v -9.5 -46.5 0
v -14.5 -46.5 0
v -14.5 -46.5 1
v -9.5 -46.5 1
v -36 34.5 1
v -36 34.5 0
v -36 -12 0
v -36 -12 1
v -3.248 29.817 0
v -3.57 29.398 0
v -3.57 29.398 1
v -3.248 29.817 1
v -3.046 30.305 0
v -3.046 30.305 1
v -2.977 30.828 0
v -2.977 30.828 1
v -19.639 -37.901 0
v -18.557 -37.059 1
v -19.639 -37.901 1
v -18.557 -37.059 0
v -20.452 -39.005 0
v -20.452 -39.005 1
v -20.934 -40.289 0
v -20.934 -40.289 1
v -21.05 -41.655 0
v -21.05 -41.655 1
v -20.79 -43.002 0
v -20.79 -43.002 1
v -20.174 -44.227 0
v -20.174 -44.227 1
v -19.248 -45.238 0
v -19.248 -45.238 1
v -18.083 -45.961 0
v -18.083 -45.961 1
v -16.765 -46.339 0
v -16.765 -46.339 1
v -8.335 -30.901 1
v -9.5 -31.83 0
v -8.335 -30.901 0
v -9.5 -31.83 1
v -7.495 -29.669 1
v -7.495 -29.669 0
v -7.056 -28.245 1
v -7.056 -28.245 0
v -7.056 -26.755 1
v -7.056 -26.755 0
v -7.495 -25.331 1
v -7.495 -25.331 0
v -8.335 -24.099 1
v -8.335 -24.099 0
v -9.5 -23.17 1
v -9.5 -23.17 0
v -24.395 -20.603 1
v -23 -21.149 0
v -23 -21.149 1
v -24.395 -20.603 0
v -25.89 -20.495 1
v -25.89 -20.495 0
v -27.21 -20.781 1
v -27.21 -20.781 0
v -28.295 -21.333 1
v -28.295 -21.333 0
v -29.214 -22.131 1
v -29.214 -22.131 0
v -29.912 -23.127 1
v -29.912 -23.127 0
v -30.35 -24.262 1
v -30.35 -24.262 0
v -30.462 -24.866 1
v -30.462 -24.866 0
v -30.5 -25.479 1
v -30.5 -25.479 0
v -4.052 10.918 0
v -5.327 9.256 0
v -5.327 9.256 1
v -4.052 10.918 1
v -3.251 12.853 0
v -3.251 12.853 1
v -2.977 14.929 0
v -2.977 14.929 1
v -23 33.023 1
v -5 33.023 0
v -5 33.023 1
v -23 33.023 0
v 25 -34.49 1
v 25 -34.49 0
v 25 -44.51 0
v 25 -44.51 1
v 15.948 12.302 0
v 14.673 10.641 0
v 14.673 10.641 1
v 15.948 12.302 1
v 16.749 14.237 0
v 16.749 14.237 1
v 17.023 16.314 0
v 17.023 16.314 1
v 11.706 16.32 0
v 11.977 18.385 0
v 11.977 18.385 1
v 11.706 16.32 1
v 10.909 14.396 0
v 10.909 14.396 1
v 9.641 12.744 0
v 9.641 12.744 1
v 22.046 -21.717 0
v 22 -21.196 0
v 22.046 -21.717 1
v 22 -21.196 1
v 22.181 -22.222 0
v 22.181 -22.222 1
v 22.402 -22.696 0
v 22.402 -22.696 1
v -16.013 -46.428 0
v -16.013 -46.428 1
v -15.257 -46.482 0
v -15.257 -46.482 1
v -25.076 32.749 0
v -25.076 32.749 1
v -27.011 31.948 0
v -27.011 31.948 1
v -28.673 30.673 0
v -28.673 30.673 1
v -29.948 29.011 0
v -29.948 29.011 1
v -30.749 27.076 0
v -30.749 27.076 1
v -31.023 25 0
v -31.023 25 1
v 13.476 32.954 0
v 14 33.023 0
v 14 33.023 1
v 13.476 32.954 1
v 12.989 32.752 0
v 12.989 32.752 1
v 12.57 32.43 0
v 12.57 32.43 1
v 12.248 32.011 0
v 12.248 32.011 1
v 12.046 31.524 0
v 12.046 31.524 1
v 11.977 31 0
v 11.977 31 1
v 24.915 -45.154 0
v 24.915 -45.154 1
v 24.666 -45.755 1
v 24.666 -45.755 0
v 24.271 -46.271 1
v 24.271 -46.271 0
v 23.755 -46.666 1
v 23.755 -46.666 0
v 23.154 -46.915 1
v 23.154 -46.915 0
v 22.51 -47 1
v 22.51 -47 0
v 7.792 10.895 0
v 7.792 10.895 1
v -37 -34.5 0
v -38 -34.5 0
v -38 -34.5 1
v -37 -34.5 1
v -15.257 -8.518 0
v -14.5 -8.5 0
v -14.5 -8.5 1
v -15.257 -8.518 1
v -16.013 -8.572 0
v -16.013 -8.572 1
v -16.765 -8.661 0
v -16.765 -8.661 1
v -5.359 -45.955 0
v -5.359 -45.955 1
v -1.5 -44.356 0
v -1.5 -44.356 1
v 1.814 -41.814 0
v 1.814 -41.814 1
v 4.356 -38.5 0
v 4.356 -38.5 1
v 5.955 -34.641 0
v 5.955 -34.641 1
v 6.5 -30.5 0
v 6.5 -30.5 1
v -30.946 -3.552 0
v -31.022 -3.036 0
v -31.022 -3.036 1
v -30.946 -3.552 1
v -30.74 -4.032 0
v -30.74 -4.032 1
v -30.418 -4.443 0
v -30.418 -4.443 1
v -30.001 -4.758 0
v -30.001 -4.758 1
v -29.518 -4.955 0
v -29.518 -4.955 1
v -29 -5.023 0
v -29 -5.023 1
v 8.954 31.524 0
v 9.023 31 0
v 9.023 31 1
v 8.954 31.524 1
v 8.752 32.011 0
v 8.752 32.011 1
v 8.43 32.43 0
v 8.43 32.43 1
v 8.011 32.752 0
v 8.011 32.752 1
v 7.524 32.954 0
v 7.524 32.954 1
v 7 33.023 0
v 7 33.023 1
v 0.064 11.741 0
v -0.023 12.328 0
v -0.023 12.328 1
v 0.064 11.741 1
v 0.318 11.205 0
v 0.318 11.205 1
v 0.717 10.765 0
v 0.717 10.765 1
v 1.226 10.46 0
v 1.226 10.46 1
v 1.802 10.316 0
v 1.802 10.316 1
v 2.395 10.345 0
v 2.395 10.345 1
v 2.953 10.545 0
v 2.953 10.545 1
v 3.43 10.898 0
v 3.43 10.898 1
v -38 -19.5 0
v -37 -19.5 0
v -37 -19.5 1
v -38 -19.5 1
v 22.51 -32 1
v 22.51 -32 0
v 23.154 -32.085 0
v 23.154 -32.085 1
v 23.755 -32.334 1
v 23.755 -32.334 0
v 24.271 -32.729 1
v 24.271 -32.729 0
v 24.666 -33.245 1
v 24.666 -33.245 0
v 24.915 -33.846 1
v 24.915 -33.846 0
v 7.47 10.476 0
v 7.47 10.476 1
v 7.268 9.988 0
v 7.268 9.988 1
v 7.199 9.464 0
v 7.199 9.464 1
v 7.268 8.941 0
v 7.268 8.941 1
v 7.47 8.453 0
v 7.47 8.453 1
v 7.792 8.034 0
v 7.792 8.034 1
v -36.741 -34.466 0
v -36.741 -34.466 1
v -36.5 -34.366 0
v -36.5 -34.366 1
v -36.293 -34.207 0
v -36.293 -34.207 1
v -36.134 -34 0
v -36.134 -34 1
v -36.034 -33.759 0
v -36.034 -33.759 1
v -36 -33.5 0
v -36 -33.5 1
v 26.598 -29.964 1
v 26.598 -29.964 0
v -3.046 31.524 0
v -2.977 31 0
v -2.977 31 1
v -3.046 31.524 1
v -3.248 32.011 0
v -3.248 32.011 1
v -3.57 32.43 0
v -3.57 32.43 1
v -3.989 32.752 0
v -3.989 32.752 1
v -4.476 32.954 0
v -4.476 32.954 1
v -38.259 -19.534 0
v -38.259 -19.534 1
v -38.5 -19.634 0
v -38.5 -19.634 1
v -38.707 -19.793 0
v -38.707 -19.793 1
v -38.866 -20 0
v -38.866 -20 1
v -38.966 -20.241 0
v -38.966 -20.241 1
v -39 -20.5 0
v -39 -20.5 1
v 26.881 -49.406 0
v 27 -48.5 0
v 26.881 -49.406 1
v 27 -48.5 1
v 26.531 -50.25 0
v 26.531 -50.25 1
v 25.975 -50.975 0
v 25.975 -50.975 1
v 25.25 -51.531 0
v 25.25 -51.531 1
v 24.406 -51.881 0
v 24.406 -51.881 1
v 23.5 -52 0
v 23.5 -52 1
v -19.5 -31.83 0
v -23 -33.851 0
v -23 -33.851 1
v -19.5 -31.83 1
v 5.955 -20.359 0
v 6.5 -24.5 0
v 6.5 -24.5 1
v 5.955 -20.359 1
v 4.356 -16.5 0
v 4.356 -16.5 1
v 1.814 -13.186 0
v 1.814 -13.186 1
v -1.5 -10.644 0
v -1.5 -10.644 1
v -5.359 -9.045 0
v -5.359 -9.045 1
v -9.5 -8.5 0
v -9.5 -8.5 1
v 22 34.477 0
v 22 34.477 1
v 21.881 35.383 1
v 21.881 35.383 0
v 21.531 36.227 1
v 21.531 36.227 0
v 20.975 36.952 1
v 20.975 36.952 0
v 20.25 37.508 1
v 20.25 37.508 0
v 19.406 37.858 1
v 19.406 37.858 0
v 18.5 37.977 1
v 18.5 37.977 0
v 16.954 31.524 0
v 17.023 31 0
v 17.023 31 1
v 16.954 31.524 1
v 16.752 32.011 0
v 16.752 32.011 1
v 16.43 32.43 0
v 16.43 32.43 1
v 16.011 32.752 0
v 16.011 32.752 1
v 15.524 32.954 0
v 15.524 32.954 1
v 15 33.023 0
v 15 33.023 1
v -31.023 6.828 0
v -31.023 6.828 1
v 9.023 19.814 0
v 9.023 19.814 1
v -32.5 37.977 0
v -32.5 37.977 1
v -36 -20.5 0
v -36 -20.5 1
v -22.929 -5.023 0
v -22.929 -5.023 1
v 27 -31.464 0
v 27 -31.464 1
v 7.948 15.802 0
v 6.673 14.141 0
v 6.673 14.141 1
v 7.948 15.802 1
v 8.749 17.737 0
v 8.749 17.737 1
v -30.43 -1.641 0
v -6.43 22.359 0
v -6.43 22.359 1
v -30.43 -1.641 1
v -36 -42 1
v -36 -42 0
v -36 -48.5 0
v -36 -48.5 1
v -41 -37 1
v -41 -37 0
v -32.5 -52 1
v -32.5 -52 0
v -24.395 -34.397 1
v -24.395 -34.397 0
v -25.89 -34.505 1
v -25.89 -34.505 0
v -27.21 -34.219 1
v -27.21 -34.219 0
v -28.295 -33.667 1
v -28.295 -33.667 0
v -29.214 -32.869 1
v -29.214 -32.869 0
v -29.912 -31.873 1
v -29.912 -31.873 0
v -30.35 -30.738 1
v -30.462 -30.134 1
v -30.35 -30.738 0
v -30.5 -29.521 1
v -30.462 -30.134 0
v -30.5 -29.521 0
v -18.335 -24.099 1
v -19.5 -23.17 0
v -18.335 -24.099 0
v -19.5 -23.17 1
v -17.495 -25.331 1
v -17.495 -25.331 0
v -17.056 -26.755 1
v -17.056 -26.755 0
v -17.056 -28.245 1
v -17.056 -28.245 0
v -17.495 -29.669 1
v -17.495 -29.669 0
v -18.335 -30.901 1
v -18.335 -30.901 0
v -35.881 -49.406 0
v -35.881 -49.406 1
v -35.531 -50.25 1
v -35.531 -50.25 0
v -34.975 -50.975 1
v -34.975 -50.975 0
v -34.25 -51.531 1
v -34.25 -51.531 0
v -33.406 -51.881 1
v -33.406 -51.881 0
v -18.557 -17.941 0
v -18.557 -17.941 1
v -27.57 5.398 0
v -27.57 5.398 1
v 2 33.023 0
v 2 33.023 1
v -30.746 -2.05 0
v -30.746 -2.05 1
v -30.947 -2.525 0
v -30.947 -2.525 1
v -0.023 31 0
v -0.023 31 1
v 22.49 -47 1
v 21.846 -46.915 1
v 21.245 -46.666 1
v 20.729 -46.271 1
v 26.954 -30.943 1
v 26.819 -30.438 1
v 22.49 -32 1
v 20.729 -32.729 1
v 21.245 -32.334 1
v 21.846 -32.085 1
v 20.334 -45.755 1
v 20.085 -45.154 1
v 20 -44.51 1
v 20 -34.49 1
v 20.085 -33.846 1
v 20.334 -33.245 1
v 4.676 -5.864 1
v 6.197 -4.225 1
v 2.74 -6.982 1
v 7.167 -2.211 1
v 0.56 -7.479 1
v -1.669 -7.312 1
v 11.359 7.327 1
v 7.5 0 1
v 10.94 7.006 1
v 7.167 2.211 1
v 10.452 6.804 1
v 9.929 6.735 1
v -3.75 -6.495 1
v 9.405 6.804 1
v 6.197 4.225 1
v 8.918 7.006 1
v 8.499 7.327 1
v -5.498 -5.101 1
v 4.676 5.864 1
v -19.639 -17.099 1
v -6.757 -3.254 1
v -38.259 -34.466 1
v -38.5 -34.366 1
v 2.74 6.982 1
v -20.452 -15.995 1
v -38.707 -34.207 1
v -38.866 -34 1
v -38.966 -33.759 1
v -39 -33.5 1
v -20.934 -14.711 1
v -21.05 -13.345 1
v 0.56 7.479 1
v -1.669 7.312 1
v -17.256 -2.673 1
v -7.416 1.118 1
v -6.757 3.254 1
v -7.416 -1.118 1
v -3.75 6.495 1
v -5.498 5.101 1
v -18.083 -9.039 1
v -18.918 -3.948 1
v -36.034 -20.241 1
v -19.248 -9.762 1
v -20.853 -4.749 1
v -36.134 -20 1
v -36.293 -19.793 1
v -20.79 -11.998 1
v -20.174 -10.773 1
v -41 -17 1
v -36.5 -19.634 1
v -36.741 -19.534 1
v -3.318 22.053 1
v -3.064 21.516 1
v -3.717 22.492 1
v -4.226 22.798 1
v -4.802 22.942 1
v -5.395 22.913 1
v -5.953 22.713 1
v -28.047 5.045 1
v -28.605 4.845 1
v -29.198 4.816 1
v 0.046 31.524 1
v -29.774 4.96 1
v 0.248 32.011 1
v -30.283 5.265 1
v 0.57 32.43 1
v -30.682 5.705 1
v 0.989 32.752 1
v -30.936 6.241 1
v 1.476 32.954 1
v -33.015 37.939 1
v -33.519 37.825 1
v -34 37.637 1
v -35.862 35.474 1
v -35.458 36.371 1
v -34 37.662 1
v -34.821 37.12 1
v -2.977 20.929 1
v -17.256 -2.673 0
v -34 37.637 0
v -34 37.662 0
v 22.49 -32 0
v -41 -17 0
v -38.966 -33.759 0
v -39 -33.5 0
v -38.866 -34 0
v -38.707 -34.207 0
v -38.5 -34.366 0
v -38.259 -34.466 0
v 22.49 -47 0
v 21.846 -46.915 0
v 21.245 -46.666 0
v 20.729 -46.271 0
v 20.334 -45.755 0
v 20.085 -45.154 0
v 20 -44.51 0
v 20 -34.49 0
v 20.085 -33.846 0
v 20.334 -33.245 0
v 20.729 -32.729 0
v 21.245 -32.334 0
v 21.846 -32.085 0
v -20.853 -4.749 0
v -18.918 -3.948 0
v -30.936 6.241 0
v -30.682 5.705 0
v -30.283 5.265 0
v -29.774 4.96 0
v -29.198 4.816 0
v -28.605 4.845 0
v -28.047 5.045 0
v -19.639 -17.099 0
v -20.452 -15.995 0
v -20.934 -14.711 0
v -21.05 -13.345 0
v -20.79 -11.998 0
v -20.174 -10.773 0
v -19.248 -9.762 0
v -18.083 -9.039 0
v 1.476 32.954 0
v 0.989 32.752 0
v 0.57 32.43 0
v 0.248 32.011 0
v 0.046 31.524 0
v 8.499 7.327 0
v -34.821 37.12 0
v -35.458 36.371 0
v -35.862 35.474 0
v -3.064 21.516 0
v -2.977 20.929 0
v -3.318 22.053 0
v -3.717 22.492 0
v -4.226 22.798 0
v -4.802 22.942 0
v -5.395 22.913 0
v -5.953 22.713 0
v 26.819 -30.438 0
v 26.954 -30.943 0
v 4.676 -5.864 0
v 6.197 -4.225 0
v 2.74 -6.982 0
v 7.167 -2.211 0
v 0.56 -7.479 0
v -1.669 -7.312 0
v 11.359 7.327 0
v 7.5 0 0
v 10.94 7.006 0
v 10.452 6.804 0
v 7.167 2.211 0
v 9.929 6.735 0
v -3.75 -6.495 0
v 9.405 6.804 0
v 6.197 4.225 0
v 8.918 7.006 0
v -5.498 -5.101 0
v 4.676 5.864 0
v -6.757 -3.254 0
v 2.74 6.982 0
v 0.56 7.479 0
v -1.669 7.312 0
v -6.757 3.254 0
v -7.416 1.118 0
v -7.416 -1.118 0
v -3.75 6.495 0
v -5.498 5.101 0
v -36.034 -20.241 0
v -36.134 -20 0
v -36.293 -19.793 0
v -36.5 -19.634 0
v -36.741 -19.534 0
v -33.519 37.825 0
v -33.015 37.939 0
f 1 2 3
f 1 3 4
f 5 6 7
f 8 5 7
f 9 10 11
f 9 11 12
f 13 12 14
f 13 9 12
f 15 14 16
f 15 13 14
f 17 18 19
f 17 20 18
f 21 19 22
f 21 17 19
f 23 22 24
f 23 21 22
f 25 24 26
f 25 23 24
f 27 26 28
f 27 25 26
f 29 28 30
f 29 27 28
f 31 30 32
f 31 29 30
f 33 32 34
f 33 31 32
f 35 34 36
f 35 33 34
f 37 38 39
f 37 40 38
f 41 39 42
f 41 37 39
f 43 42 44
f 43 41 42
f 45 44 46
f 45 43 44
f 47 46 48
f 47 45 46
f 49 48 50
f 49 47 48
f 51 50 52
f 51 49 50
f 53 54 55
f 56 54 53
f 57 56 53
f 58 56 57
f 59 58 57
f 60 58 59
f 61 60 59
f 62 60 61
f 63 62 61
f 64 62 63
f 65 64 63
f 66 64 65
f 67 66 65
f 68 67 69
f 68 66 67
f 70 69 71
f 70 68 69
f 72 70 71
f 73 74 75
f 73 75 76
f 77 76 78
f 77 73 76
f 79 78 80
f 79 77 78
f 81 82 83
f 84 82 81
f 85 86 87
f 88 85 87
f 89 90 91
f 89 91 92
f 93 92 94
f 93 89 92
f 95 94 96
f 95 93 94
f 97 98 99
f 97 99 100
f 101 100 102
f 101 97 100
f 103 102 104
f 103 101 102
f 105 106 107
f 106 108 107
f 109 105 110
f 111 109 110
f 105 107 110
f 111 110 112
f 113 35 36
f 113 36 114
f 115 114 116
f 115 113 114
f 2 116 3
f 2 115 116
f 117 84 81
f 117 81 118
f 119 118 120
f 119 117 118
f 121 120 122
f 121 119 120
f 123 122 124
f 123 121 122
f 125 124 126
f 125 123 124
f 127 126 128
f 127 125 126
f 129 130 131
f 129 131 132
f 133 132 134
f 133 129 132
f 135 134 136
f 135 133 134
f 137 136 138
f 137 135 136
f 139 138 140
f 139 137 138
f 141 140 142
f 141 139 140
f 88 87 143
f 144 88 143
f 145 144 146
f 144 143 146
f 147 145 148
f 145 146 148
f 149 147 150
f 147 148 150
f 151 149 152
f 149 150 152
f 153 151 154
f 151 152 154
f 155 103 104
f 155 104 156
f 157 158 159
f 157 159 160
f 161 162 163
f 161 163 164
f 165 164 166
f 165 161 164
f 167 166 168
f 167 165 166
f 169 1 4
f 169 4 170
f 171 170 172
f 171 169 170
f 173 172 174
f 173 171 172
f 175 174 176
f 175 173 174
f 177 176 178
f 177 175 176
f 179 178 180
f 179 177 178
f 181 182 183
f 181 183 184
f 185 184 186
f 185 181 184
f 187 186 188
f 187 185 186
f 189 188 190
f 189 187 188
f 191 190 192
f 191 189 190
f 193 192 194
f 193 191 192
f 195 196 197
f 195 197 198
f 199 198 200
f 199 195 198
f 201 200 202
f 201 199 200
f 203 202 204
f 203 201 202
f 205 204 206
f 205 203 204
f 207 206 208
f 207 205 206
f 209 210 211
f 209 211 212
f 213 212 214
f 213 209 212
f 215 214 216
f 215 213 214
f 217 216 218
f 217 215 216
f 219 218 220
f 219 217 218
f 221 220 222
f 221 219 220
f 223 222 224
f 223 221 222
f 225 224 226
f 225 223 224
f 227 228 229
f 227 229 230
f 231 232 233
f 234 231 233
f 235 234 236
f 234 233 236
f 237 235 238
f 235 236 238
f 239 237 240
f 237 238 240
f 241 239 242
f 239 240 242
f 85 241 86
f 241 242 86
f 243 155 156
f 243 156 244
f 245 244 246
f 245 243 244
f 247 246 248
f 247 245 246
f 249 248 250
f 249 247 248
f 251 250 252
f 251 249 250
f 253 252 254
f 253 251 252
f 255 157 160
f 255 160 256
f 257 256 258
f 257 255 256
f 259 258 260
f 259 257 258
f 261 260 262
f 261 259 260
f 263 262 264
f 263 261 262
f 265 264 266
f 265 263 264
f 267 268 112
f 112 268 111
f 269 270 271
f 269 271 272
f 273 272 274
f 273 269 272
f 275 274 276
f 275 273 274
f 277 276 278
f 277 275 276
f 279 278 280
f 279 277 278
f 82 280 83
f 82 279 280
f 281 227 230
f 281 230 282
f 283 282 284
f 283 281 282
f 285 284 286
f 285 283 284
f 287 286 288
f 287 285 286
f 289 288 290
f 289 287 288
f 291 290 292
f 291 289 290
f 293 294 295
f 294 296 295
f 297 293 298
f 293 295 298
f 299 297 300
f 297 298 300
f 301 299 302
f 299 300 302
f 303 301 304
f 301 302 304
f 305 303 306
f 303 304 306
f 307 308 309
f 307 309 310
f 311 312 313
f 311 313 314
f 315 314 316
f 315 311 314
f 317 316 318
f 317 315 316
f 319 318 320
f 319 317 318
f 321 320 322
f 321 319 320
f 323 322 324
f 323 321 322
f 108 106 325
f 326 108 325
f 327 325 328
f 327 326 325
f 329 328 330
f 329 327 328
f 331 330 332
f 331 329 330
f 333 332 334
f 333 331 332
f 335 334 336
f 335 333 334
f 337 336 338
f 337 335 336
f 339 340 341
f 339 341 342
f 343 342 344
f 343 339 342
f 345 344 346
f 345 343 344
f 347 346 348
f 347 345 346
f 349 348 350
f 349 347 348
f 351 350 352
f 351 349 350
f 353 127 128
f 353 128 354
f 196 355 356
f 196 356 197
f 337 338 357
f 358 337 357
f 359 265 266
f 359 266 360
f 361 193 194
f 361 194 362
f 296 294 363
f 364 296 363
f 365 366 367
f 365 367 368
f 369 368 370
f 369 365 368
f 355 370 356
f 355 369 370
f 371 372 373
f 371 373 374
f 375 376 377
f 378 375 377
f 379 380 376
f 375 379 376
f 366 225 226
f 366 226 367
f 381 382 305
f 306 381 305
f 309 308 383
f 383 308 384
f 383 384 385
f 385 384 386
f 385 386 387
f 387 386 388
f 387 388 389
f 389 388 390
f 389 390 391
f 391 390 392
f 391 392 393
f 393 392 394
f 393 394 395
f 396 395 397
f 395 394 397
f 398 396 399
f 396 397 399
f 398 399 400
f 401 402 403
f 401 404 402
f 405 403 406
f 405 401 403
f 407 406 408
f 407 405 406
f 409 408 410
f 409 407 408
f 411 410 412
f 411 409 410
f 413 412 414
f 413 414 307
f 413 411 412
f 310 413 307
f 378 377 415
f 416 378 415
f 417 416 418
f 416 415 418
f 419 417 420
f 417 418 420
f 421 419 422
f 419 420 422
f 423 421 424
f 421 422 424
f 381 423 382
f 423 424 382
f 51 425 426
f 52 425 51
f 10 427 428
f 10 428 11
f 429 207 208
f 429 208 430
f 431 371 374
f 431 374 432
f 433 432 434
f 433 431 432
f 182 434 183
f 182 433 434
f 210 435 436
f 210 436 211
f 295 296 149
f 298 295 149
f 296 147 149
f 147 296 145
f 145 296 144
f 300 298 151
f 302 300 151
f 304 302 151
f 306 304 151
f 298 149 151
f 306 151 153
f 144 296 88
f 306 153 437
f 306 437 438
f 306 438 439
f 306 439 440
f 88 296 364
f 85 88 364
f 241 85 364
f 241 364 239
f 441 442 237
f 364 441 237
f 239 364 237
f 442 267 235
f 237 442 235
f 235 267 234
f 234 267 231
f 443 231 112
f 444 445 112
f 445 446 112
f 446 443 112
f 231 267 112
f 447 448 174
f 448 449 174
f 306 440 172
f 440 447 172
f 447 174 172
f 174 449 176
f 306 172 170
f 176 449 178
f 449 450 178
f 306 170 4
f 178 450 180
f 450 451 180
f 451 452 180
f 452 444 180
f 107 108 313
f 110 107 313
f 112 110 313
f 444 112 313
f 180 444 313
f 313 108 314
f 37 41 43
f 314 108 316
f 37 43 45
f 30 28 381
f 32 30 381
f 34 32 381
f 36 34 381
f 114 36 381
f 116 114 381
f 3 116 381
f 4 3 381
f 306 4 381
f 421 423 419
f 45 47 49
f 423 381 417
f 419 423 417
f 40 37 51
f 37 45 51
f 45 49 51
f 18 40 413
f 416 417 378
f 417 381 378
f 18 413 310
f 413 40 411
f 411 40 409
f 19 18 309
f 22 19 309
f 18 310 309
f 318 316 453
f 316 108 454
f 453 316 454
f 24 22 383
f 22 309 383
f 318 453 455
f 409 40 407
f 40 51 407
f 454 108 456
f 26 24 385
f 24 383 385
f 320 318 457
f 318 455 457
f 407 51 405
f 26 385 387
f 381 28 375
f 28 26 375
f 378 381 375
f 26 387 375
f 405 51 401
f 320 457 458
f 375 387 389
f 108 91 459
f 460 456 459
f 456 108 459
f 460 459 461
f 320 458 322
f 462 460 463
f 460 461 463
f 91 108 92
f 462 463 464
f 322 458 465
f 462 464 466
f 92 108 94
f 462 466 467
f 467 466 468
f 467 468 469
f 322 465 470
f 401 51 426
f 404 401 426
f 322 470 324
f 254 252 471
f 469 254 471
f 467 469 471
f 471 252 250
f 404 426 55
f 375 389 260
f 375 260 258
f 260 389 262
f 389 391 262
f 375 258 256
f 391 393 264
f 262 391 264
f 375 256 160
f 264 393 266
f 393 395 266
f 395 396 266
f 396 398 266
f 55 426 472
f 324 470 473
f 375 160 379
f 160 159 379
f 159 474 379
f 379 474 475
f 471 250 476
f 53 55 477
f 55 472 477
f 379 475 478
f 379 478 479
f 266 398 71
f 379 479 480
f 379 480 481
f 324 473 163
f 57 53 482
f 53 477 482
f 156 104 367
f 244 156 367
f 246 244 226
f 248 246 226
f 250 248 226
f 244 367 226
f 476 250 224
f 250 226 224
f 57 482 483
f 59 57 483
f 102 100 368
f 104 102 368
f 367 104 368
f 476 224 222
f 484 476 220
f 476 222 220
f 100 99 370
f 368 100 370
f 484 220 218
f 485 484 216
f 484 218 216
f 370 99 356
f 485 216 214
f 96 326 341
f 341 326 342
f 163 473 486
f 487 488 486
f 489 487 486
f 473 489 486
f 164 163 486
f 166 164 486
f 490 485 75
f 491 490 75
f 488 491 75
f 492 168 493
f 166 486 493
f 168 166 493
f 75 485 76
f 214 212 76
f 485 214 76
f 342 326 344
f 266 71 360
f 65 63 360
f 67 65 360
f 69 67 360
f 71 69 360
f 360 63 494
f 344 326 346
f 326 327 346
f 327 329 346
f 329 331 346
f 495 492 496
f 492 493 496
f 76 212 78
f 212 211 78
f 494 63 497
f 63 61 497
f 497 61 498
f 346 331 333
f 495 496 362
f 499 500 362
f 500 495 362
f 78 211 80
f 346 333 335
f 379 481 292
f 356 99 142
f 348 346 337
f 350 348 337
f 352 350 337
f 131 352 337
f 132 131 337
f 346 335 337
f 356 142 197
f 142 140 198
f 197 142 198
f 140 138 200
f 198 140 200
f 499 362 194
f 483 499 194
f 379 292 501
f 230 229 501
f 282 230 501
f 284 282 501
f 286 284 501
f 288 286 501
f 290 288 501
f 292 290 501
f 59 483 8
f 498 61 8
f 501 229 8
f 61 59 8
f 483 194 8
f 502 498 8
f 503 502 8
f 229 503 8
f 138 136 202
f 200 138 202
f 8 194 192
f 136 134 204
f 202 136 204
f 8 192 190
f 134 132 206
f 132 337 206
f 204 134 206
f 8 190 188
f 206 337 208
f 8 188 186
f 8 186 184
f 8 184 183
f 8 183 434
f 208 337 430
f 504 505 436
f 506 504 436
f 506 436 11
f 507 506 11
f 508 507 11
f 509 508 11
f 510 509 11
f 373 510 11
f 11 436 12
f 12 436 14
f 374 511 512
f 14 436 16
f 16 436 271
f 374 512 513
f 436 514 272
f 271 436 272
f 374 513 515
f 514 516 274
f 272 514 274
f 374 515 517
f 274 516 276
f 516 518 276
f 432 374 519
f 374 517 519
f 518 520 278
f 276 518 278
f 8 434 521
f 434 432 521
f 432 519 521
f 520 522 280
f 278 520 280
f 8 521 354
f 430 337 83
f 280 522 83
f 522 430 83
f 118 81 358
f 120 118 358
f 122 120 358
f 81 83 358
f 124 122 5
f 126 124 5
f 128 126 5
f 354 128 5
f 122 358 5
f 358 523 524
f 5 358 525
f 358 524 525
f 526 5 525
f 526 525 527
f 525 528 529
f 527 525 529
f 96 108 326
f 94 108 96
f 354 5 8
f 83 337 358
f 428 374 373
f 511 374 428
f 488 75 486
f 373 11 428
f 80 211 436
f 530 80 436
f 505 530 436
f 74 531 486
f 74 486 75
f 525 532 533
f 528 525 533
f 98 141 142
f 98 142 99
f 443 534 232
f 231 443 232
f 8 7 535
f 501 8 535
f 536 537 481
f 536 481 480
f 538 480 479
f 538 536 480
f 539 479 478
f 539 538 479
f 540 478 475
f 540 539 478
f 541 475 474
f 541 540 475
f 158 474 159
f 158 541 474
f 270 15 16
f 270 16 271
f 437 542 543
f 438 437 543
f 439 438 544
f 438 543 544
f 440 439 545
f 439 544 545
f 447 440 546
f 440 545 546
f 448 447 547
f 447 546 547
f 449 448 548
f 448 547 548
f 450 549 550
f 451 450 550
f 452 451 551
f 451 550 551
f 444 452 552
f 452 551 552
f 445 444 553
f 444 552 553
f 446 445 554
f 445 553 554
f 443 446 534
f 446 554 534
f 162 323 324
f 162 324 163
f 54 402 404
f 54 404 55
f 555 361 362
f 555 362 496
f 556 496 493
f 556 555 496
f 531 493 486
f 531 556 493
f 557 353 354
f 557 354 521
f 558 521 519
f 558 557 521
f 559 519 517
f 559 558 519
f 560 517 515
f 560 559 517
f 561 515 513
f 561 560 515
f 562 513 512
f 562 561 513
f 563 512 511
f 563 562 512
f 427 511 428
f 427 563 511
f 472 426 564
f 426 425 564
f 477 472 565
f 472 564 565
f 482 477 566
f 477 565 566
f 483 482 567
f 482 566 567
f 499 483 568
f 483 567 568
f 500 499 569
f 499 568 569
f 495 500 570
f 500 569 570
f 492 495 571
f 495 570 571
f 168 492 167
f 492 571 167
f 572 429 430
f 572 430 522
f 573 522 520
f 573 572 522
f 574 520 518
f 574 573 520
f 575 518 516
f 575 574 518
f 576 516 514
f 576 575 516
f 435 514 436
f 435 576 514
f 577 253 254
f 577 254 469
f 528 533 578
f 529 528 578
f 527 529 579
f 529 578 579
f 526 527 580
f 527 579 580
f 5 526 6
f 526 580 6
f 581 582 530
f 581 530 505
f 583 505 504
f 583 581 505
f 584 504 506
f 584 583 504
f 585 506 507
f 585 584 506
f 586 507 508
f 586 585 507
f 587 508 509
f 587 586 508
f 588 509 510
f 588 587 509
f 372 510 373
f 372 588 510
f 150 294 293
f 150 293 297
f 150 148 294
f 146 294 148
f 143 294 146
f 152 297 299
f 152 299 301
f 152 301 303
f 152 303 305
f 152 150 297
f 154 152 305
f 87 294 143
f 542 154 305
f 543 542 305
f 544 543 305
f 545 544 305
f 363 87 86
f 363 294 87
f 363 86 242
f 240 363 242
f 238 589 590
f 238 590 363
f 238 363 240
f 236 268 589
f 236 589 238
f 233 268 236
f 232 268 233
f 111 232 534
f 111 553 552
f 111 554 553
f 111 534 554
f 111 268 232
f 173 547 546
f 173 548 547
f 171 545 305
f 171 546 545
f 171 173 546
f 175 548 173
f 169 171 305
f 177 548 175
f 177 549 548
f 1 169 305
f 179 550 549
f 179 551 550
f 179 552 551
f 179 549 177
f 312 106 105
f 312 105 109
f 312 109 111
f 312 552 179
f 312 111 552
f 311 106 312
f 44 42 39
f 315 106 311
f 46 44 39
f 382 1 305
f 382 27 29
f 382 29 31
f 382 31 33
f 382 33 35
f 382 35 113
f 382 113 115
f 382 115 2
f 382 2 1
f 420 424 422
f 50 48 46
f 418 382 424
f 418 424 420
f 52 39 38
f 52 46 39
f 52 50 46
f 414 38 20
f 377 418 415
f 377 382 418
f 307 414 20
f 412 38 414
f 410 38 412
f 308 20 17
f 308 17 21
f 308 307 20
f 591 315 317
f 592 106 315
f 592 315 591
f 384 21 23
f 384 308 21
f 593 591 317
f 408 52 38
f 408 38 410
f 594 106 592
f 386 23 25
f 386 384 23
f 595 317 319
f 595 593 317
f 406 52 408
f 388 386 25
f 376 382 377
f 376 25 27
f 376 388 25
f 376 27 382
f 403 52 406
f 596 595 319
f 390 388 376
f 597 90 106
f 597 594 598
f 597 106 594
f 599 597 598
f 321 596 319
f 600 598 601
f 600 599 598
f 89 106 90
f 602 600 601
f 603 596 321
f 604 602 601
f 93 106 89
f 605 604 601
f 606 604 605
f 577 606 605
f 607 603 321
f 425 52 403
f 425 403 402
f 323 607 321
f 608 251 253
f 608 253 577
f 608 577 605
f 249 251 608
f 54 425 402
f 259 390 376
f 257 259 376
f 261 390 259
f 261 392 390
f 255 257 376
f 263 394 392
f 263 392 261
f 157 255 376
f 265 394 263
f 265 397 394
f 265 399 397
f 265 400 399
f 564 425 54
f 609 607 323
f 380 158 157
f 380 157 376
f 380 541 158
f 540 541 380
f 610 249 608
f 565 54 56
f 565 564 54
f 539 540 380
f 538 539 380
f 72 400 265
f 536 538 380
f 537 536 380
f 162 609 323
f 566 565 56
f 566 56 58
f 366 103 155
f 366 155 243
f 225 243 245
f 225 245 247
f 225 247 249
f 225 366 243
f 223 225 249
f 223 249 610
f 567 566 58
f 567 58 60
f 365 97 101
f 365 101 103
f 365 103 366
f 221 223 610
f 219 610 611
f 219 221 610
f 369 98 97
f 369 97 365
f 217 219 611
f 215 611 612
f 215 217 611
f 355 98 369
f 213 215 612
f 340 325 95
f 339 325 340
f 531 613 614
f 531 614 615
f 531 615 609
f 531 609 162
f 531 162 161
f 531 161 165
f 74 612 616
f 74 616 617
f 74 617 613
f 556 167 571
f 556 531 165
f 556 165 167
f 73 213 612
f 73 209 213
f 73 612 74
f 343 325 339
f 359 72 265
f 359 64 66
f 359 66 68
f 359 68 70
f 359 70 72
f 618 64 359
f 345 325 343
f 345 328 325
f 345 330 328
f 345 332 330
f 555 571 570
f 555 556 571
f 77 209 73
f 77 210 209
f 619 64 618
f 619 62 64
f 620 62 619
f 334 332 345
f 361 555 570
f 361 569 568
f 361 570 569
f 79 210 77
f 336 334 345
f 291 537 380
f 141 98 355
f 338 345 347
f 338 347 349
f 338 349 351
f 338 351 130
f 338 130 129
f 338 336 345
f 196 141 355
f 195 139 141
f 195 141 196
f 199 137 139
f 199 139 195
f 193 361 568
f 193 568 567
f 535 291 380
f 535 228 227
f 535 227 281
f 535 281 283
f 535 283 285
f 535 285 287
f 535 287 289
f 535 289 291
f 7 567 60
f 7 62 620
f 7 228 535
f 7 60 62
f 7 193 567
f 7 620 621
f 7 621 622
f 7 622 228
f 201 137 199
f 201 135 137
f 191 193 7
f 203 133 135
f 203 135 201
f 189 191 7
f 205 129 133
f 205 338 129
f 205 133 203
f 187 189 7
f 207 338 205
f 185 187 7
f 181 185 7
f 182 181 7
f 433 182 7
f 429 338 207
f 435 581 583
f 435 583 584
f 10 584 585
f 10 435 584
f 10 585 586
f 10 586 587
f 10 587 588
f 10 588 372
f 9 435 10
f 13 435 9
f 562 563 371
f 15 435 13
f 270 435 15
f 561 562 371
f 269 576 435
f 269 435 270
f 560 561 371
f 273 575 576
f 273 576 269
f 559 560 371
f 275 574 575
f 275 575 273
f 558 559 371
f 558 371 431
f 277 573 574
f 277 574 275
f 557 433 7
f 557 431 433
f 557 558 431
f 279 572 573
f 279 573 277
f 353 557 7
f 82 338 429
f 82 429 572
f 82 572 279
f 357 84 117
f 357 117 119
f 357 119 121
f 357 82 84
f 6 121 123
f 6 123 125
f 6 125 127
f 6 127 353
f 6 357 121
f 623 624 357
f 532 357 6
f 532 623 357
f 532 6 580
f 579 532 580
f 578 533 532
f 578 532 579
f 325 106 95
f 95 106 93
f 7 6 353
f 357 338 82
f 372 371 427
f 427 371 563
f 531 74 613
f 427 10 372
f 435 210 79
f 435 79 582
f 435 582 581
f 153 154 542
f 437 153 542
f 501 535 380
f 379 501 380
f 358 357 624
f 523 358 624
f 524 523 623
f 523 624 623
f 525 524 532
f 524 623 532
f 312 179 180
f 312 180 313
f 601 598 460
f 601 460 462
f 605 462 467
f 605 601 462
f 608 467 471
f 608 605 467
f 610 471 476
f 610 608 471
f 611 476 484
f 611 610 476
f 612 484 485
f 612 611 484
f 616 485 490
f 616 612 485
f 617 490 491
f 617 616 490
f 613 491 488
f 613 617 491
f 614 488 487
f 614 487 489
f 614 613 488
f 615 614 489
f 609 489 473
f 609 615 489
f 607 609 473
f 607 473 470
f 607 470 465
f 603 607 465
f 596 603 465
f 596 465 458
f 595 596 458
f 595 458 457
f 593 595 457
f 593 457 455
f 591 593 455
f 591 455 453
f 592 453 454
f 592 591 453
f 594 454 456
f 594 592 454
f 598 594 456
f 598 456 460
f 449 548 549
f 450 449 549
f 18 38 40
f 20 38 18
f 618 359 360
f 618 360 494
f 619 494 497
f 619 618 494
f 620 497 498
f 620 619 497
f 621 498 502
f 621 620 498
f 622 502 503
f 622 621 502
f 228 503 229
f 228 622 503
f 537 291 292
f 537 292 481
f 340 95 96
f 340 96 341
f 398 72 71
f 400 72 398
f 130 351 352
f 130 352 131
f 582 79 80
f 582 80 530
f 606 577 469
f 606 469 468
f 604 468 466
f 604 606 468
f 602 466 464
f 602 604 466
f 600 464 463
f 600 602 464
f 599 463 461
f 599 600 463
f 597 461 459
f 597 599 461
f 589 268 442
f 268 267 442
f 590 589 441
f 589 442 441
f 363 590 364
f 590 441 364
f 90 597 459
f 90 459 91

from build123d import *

# Parameters (mm, degrees)
SKETCH_1_R          = 7.5
EXTRUDE_1_DEPTH     = 1
FILLET_1_R          = 3
FILLET_2_R          = 3.5
CUT_EXTRUDE_1_DEPTH = 10
EXTRUDE_2_DEPTH     = 1
FILLET_3_R          = 5


with BuildPart() as part:
    # 草图1 → 凸台-拉伸1 (new body)
    with BuildSketch(Plane.XY):
        with BuildLine():
            Line((-34, 37.637190605), (-34, 37.66227766))
            ThreePointArc((-34, 37.66227766), (-35.458039892, 36.370828693), (-36, 34.5))
            Line((-36, 34.5), (-36, -12))
            Line((-36, -12), (-41, -17))
            Line((-41, -17), (-41, -37))
            Line((-41, -37), (-36, -42))
            Line((-36, -42), (-36, -48.5))
            ThreePointArc((-36, -48.5), (-34.974873734, -50.974873734), (-32.5, -52))
            Line((-32.5, -52), (-3, -52))
            Line((-3, -52), (27, -52))
            Line((27, -52), (27, -30.660254038))
            Line((27, -30.660254038), (22, -22))
            Line((22, -22), (22, -2))
            Line((22, -2), (22, 37.977350269))
            Line((22, 37.977350269), (-32.5, 37.977350269))
            ThreePointArc((-32.5, 37.977350269), (-33.269043009, 37.891244277), (-34, 37.637190605))
        make_face()
        Circle(SKETCH_1_R, mode=Mode.SUBTRACT)
        with BuildLine():
            Line((-38, -34.5), (-37, -34.5))
            ThreePointArc((-37, -34.5), (-36.292893219, -34.207106781), (-36, -33.5))
            Line((-36, -33.5), (-36, -20.5))
            ThreePointArc((-36, -20.5), (-36.292893219, -19.792893219), (-37, -19.5))
            Line((-37, -19.5), (-38, -19.5))
            ThreePointArc((-38, -19.5), (-38.707106781, -19.792893219), (-39, -20.5))
            Line((-39, -20.5), (-39, -33.5))
            ThreePointArc((-39, -33.5), (-38.707106781, -34.207106781), (-38, -34.5))
        make_face(mode=Mode.SUBTRACT)
        with BuildLine():
            Line((-14.5, -46.5), (-9.5, -46.5))
            ThreePointArc((-9.5, -46.5), (1.813708499, -41.813708499), (6.5, -30.5))
            Line((6.5, -30.5), (6.5, -24.5))
            ThreePointArc((6.5, -24.5), (1.813708499, -13.186291501), (-9.5, -8.5))
            Line((-9.5, -8.5), (-14.5, -8.5))
            ThreePointArc((-14.5, -8.5), (-25.813708499, -13.186291501), (-30.5, -24.5))
            Line((-30.5, -24.5), (-30.5, -30.5))
            ThreePointArc((-30.5, -30.5), (-25.813708499, -41.813708499), (-14.5, -46.5))
        make_face(mode=Mode.SUBTRACT)
        with BuildLine():
            Line((11.977350269, 31), (11.977350269, 18.384776311))
            ThreePointArc((11.977350269, 18.384776311), (11.370110637, 15.331976529), (9.640838471, 12.74393784))
            Line((9.640838471, 12.74393784), (7.791596066, 10.894695435))
            ThreePointArc((7.791596066, 10.894695435), (7.199175676, 9.464466094), (7.791596066, 8.034236753))
            Line((7.791596066, 8.034236753), (8.498702848, 7.327129972))
            ThreePointArc((8.498702848, 7.327129972), (9.928932188, 6.734709582), (11.359161529, 7.327129972))
            Line((11.359161529, 7.327129972), (14.672870028, 10.640838471))
            ThreePointArc((14.672870028, 10.640838471), (16.411961883, 13.243573363), (17.022649731, 16.313708499))
            Line((17.022649731, 16.313708499), (17.022649731, 31))
            ThreePointArc((17.022649731, 31), (16.430229341, 32.430229341), (15, 33.022649731))
            Line((15, 33.022649731), (14, 33.022649731))
            ThreePointArc((14, 33.022649731), (12.569770659, 32.430229341), (11.977350269, 31))
        make_face(mode=Mode.SUBTRACT)
        with BuildLine():
            Line((7, 33.022649731), (2, 33.022649731))
            ThreePointArc((2, 33.022649731), (0.569770659, 32.430229341), (-0.022649731, 31))
            Line((-0.022649731, 31), (-0.022649731, 12.328427125))
            ThreePointArc((-0.022649731, 12.328427125), (1.225965459, 10.459742437), (3.430229341, 10.898197784))
            Line((3.430229341, 10.898197784), (6.672870028, 14.140838471))
            ThreePointArc((6.672870028, 14.140838471), (8.411961883, 16.743573363), (9.022649731, 19.813708499))
            Line((9.022649731, 19.813708499), (9.022649731, 31))
            ThreePointArc((9.022649731, 31), (8.430229341, 32.430229341), (7, 33.022649731))
        make_face(mode=Mode.SUBTRACT)
        with BuildLine():
            Line((-6.430229341, 22.359161529), (-30.430229341, -1.640838471))
            ThreePointArc((-30.430229341, -1.640838471), (-30.861813207, -2.280647977), (-31.022337577, -3.035533906))
            ThreePointArc((-31.022337577, -3.035533906), (-30.41761054, -4.442737776), (-29, -5.022649731))
            Line((-29, -5.022649731), (-22.928932188, -5.022649731))
            ThreePointArc((-22.928932188, -5.022649731), (-19.858797052, -4.411961883), (-17.25606216, -2.672870028))
            Line((-17.25606216, -2.672870028), (-5.327129972, 9.25606216))
            ThreePointArc((-5.327129972, 9.25606216), (-3.588038117, 11.858797052), (-2.977350269, 14.928932188))
            Line((-2.977350269, 14.928932188), (-2.977350269, 20.928932188))
            ThreePointArc((-2.977350269, 20.928932188), (-4.225965459, 22.797616876), (-6.430229341, 22.359161529))
        make_face(mode=Mode.SUBTRACT)
        with BuildLine():
            Line((-27.569770659, 5.398197784), (-3.569770659, 29.398197784))
            ThreePointArc((-3.569770659, 29.398197784), (-3.131315312, 30.054392583), (-2.977350269, 30.828427125))
            Line((-2.977350269, 30.828427125), (-2.977350269, 31))
            ThreePointArc((-2.977350269, 31), (-3.569770659, 32.430229341), (-5, 33.022649731))
            Line((-5, 33.022649731), (-23, 33.022649731))
            ThreePointArc((-23, 33.022649731), (-28.672870028, 30.672870028), (-31.022649731, 25))
            Line((-31.022649731, 25), (-31.022649731, 6.828427125))
            ThreePointArc((-31.022649731, 6.828427125), (-29.774034541, 4.959742437), (-27.569770659, 5.398197784))
        make_face(mode=Mode.SUBTRACT)
    extrude(amount=EXTRUDE_1_DEPTH)

    # 圆角1
    fillet_1_edges = [part.edges().sort_by_distance(p)[0] for p in [
        (22, -22, 0.5),
        (27, -30.660254038, 0.5),
    ]]
    fillet(fillet_1_edges, radius=FILLET_1_R)

    # 圆角2
    fillet_2_edges = [part.edges().sort_by_distance(p)[0] for p in [
        (22, 37.977350269, 0.5),
        (27, -52, 0.5),
    ]]
    fillet(fillet_2_edges, radius=FILLET_2_R)

    # 草图2 → 切除-拉伸1 (cut)
    with BuildSketch(Plane(origin=(0, 0, 0), x_dir=(-1, 0, 0), z_dir=(0, 0, -1))):
        with BuildLine():
            Line((-22.51, -47), (-22.49, -47))
            ThreePointArc((-22.49, -47), (-20.729304115, -46.270695885), (-20, -44.51))
            Line((-20, -44.51), (-20, -34.49))
            ThreePointArc((-20, -34.49), (-20.729304115, -32.729304115), (-22.49, -32))
            Line((-22.49, -32), (-22.51, -32))
            ThreePointArc((-22.51, -32), (-24.270695885, -32.729304115), (-25, -34.49))
            Line((-25, -34.49), (-25, -44.51))
            ThreePointArc((-25, -44.51), (-24.270695885, -46.270695885), (-22.51, -47))
        make_face()
    extrude(amount=-CUT_EXTRUDE_1_DEPTH, mode=Mode.SUBTRACT)

    # 草图3 → 凸台-拉伸2 (add)
    with BuildSketch(Plane(origin=(0, 0, 0), x_dir=(-1, 0, 0), z_dir=(0, 0, -1))):
        with BuildLine():
            Line((12, -27.5), (29.320508076, -17.5))
            ThreePointArc((29.320508076, -17.5), (30.076804592, -18.942597605), (30.713203436, -20.441953728))
            Line((30.713203436, -20.441953728), (30.713203436, -10.922424267))
            Line((30.713203436, -10.922424267), (2, -27.5))
            Line((2, -27.5), (30.713203436, -44.077575733))
            Line((30.713203436, -44.077575733), (30.713203436, -34.558046272))
            ThreePointArc((30.713203436, -34.558046272), (30.076804592, -36.057402395), (29.320508076, -37.5))
            Line((29.320508076, -37.5), (12, -27.5))
        make_face()
    extrude(amount=-EXTRUDE_2_DEPTH)

    # 圆角3
    fillet_3_edges = [part.edges().sort_by_distance(p)[0] for p in [
        (-26.164686329, -41.451488157, 0.5),
        (-28.98117459, -37.304085721, 0.5),
        (-28.98117459, -17.695914279, 0.5),
        (-26.164686329, -13.548511843, 0.5),
        (-12, -27.5, 0.5),
        (-2, -27.5, 0.5),
    ]]
    fillet(fillet_3_edges, radius=FILLET_3_R)


solid = part.part
